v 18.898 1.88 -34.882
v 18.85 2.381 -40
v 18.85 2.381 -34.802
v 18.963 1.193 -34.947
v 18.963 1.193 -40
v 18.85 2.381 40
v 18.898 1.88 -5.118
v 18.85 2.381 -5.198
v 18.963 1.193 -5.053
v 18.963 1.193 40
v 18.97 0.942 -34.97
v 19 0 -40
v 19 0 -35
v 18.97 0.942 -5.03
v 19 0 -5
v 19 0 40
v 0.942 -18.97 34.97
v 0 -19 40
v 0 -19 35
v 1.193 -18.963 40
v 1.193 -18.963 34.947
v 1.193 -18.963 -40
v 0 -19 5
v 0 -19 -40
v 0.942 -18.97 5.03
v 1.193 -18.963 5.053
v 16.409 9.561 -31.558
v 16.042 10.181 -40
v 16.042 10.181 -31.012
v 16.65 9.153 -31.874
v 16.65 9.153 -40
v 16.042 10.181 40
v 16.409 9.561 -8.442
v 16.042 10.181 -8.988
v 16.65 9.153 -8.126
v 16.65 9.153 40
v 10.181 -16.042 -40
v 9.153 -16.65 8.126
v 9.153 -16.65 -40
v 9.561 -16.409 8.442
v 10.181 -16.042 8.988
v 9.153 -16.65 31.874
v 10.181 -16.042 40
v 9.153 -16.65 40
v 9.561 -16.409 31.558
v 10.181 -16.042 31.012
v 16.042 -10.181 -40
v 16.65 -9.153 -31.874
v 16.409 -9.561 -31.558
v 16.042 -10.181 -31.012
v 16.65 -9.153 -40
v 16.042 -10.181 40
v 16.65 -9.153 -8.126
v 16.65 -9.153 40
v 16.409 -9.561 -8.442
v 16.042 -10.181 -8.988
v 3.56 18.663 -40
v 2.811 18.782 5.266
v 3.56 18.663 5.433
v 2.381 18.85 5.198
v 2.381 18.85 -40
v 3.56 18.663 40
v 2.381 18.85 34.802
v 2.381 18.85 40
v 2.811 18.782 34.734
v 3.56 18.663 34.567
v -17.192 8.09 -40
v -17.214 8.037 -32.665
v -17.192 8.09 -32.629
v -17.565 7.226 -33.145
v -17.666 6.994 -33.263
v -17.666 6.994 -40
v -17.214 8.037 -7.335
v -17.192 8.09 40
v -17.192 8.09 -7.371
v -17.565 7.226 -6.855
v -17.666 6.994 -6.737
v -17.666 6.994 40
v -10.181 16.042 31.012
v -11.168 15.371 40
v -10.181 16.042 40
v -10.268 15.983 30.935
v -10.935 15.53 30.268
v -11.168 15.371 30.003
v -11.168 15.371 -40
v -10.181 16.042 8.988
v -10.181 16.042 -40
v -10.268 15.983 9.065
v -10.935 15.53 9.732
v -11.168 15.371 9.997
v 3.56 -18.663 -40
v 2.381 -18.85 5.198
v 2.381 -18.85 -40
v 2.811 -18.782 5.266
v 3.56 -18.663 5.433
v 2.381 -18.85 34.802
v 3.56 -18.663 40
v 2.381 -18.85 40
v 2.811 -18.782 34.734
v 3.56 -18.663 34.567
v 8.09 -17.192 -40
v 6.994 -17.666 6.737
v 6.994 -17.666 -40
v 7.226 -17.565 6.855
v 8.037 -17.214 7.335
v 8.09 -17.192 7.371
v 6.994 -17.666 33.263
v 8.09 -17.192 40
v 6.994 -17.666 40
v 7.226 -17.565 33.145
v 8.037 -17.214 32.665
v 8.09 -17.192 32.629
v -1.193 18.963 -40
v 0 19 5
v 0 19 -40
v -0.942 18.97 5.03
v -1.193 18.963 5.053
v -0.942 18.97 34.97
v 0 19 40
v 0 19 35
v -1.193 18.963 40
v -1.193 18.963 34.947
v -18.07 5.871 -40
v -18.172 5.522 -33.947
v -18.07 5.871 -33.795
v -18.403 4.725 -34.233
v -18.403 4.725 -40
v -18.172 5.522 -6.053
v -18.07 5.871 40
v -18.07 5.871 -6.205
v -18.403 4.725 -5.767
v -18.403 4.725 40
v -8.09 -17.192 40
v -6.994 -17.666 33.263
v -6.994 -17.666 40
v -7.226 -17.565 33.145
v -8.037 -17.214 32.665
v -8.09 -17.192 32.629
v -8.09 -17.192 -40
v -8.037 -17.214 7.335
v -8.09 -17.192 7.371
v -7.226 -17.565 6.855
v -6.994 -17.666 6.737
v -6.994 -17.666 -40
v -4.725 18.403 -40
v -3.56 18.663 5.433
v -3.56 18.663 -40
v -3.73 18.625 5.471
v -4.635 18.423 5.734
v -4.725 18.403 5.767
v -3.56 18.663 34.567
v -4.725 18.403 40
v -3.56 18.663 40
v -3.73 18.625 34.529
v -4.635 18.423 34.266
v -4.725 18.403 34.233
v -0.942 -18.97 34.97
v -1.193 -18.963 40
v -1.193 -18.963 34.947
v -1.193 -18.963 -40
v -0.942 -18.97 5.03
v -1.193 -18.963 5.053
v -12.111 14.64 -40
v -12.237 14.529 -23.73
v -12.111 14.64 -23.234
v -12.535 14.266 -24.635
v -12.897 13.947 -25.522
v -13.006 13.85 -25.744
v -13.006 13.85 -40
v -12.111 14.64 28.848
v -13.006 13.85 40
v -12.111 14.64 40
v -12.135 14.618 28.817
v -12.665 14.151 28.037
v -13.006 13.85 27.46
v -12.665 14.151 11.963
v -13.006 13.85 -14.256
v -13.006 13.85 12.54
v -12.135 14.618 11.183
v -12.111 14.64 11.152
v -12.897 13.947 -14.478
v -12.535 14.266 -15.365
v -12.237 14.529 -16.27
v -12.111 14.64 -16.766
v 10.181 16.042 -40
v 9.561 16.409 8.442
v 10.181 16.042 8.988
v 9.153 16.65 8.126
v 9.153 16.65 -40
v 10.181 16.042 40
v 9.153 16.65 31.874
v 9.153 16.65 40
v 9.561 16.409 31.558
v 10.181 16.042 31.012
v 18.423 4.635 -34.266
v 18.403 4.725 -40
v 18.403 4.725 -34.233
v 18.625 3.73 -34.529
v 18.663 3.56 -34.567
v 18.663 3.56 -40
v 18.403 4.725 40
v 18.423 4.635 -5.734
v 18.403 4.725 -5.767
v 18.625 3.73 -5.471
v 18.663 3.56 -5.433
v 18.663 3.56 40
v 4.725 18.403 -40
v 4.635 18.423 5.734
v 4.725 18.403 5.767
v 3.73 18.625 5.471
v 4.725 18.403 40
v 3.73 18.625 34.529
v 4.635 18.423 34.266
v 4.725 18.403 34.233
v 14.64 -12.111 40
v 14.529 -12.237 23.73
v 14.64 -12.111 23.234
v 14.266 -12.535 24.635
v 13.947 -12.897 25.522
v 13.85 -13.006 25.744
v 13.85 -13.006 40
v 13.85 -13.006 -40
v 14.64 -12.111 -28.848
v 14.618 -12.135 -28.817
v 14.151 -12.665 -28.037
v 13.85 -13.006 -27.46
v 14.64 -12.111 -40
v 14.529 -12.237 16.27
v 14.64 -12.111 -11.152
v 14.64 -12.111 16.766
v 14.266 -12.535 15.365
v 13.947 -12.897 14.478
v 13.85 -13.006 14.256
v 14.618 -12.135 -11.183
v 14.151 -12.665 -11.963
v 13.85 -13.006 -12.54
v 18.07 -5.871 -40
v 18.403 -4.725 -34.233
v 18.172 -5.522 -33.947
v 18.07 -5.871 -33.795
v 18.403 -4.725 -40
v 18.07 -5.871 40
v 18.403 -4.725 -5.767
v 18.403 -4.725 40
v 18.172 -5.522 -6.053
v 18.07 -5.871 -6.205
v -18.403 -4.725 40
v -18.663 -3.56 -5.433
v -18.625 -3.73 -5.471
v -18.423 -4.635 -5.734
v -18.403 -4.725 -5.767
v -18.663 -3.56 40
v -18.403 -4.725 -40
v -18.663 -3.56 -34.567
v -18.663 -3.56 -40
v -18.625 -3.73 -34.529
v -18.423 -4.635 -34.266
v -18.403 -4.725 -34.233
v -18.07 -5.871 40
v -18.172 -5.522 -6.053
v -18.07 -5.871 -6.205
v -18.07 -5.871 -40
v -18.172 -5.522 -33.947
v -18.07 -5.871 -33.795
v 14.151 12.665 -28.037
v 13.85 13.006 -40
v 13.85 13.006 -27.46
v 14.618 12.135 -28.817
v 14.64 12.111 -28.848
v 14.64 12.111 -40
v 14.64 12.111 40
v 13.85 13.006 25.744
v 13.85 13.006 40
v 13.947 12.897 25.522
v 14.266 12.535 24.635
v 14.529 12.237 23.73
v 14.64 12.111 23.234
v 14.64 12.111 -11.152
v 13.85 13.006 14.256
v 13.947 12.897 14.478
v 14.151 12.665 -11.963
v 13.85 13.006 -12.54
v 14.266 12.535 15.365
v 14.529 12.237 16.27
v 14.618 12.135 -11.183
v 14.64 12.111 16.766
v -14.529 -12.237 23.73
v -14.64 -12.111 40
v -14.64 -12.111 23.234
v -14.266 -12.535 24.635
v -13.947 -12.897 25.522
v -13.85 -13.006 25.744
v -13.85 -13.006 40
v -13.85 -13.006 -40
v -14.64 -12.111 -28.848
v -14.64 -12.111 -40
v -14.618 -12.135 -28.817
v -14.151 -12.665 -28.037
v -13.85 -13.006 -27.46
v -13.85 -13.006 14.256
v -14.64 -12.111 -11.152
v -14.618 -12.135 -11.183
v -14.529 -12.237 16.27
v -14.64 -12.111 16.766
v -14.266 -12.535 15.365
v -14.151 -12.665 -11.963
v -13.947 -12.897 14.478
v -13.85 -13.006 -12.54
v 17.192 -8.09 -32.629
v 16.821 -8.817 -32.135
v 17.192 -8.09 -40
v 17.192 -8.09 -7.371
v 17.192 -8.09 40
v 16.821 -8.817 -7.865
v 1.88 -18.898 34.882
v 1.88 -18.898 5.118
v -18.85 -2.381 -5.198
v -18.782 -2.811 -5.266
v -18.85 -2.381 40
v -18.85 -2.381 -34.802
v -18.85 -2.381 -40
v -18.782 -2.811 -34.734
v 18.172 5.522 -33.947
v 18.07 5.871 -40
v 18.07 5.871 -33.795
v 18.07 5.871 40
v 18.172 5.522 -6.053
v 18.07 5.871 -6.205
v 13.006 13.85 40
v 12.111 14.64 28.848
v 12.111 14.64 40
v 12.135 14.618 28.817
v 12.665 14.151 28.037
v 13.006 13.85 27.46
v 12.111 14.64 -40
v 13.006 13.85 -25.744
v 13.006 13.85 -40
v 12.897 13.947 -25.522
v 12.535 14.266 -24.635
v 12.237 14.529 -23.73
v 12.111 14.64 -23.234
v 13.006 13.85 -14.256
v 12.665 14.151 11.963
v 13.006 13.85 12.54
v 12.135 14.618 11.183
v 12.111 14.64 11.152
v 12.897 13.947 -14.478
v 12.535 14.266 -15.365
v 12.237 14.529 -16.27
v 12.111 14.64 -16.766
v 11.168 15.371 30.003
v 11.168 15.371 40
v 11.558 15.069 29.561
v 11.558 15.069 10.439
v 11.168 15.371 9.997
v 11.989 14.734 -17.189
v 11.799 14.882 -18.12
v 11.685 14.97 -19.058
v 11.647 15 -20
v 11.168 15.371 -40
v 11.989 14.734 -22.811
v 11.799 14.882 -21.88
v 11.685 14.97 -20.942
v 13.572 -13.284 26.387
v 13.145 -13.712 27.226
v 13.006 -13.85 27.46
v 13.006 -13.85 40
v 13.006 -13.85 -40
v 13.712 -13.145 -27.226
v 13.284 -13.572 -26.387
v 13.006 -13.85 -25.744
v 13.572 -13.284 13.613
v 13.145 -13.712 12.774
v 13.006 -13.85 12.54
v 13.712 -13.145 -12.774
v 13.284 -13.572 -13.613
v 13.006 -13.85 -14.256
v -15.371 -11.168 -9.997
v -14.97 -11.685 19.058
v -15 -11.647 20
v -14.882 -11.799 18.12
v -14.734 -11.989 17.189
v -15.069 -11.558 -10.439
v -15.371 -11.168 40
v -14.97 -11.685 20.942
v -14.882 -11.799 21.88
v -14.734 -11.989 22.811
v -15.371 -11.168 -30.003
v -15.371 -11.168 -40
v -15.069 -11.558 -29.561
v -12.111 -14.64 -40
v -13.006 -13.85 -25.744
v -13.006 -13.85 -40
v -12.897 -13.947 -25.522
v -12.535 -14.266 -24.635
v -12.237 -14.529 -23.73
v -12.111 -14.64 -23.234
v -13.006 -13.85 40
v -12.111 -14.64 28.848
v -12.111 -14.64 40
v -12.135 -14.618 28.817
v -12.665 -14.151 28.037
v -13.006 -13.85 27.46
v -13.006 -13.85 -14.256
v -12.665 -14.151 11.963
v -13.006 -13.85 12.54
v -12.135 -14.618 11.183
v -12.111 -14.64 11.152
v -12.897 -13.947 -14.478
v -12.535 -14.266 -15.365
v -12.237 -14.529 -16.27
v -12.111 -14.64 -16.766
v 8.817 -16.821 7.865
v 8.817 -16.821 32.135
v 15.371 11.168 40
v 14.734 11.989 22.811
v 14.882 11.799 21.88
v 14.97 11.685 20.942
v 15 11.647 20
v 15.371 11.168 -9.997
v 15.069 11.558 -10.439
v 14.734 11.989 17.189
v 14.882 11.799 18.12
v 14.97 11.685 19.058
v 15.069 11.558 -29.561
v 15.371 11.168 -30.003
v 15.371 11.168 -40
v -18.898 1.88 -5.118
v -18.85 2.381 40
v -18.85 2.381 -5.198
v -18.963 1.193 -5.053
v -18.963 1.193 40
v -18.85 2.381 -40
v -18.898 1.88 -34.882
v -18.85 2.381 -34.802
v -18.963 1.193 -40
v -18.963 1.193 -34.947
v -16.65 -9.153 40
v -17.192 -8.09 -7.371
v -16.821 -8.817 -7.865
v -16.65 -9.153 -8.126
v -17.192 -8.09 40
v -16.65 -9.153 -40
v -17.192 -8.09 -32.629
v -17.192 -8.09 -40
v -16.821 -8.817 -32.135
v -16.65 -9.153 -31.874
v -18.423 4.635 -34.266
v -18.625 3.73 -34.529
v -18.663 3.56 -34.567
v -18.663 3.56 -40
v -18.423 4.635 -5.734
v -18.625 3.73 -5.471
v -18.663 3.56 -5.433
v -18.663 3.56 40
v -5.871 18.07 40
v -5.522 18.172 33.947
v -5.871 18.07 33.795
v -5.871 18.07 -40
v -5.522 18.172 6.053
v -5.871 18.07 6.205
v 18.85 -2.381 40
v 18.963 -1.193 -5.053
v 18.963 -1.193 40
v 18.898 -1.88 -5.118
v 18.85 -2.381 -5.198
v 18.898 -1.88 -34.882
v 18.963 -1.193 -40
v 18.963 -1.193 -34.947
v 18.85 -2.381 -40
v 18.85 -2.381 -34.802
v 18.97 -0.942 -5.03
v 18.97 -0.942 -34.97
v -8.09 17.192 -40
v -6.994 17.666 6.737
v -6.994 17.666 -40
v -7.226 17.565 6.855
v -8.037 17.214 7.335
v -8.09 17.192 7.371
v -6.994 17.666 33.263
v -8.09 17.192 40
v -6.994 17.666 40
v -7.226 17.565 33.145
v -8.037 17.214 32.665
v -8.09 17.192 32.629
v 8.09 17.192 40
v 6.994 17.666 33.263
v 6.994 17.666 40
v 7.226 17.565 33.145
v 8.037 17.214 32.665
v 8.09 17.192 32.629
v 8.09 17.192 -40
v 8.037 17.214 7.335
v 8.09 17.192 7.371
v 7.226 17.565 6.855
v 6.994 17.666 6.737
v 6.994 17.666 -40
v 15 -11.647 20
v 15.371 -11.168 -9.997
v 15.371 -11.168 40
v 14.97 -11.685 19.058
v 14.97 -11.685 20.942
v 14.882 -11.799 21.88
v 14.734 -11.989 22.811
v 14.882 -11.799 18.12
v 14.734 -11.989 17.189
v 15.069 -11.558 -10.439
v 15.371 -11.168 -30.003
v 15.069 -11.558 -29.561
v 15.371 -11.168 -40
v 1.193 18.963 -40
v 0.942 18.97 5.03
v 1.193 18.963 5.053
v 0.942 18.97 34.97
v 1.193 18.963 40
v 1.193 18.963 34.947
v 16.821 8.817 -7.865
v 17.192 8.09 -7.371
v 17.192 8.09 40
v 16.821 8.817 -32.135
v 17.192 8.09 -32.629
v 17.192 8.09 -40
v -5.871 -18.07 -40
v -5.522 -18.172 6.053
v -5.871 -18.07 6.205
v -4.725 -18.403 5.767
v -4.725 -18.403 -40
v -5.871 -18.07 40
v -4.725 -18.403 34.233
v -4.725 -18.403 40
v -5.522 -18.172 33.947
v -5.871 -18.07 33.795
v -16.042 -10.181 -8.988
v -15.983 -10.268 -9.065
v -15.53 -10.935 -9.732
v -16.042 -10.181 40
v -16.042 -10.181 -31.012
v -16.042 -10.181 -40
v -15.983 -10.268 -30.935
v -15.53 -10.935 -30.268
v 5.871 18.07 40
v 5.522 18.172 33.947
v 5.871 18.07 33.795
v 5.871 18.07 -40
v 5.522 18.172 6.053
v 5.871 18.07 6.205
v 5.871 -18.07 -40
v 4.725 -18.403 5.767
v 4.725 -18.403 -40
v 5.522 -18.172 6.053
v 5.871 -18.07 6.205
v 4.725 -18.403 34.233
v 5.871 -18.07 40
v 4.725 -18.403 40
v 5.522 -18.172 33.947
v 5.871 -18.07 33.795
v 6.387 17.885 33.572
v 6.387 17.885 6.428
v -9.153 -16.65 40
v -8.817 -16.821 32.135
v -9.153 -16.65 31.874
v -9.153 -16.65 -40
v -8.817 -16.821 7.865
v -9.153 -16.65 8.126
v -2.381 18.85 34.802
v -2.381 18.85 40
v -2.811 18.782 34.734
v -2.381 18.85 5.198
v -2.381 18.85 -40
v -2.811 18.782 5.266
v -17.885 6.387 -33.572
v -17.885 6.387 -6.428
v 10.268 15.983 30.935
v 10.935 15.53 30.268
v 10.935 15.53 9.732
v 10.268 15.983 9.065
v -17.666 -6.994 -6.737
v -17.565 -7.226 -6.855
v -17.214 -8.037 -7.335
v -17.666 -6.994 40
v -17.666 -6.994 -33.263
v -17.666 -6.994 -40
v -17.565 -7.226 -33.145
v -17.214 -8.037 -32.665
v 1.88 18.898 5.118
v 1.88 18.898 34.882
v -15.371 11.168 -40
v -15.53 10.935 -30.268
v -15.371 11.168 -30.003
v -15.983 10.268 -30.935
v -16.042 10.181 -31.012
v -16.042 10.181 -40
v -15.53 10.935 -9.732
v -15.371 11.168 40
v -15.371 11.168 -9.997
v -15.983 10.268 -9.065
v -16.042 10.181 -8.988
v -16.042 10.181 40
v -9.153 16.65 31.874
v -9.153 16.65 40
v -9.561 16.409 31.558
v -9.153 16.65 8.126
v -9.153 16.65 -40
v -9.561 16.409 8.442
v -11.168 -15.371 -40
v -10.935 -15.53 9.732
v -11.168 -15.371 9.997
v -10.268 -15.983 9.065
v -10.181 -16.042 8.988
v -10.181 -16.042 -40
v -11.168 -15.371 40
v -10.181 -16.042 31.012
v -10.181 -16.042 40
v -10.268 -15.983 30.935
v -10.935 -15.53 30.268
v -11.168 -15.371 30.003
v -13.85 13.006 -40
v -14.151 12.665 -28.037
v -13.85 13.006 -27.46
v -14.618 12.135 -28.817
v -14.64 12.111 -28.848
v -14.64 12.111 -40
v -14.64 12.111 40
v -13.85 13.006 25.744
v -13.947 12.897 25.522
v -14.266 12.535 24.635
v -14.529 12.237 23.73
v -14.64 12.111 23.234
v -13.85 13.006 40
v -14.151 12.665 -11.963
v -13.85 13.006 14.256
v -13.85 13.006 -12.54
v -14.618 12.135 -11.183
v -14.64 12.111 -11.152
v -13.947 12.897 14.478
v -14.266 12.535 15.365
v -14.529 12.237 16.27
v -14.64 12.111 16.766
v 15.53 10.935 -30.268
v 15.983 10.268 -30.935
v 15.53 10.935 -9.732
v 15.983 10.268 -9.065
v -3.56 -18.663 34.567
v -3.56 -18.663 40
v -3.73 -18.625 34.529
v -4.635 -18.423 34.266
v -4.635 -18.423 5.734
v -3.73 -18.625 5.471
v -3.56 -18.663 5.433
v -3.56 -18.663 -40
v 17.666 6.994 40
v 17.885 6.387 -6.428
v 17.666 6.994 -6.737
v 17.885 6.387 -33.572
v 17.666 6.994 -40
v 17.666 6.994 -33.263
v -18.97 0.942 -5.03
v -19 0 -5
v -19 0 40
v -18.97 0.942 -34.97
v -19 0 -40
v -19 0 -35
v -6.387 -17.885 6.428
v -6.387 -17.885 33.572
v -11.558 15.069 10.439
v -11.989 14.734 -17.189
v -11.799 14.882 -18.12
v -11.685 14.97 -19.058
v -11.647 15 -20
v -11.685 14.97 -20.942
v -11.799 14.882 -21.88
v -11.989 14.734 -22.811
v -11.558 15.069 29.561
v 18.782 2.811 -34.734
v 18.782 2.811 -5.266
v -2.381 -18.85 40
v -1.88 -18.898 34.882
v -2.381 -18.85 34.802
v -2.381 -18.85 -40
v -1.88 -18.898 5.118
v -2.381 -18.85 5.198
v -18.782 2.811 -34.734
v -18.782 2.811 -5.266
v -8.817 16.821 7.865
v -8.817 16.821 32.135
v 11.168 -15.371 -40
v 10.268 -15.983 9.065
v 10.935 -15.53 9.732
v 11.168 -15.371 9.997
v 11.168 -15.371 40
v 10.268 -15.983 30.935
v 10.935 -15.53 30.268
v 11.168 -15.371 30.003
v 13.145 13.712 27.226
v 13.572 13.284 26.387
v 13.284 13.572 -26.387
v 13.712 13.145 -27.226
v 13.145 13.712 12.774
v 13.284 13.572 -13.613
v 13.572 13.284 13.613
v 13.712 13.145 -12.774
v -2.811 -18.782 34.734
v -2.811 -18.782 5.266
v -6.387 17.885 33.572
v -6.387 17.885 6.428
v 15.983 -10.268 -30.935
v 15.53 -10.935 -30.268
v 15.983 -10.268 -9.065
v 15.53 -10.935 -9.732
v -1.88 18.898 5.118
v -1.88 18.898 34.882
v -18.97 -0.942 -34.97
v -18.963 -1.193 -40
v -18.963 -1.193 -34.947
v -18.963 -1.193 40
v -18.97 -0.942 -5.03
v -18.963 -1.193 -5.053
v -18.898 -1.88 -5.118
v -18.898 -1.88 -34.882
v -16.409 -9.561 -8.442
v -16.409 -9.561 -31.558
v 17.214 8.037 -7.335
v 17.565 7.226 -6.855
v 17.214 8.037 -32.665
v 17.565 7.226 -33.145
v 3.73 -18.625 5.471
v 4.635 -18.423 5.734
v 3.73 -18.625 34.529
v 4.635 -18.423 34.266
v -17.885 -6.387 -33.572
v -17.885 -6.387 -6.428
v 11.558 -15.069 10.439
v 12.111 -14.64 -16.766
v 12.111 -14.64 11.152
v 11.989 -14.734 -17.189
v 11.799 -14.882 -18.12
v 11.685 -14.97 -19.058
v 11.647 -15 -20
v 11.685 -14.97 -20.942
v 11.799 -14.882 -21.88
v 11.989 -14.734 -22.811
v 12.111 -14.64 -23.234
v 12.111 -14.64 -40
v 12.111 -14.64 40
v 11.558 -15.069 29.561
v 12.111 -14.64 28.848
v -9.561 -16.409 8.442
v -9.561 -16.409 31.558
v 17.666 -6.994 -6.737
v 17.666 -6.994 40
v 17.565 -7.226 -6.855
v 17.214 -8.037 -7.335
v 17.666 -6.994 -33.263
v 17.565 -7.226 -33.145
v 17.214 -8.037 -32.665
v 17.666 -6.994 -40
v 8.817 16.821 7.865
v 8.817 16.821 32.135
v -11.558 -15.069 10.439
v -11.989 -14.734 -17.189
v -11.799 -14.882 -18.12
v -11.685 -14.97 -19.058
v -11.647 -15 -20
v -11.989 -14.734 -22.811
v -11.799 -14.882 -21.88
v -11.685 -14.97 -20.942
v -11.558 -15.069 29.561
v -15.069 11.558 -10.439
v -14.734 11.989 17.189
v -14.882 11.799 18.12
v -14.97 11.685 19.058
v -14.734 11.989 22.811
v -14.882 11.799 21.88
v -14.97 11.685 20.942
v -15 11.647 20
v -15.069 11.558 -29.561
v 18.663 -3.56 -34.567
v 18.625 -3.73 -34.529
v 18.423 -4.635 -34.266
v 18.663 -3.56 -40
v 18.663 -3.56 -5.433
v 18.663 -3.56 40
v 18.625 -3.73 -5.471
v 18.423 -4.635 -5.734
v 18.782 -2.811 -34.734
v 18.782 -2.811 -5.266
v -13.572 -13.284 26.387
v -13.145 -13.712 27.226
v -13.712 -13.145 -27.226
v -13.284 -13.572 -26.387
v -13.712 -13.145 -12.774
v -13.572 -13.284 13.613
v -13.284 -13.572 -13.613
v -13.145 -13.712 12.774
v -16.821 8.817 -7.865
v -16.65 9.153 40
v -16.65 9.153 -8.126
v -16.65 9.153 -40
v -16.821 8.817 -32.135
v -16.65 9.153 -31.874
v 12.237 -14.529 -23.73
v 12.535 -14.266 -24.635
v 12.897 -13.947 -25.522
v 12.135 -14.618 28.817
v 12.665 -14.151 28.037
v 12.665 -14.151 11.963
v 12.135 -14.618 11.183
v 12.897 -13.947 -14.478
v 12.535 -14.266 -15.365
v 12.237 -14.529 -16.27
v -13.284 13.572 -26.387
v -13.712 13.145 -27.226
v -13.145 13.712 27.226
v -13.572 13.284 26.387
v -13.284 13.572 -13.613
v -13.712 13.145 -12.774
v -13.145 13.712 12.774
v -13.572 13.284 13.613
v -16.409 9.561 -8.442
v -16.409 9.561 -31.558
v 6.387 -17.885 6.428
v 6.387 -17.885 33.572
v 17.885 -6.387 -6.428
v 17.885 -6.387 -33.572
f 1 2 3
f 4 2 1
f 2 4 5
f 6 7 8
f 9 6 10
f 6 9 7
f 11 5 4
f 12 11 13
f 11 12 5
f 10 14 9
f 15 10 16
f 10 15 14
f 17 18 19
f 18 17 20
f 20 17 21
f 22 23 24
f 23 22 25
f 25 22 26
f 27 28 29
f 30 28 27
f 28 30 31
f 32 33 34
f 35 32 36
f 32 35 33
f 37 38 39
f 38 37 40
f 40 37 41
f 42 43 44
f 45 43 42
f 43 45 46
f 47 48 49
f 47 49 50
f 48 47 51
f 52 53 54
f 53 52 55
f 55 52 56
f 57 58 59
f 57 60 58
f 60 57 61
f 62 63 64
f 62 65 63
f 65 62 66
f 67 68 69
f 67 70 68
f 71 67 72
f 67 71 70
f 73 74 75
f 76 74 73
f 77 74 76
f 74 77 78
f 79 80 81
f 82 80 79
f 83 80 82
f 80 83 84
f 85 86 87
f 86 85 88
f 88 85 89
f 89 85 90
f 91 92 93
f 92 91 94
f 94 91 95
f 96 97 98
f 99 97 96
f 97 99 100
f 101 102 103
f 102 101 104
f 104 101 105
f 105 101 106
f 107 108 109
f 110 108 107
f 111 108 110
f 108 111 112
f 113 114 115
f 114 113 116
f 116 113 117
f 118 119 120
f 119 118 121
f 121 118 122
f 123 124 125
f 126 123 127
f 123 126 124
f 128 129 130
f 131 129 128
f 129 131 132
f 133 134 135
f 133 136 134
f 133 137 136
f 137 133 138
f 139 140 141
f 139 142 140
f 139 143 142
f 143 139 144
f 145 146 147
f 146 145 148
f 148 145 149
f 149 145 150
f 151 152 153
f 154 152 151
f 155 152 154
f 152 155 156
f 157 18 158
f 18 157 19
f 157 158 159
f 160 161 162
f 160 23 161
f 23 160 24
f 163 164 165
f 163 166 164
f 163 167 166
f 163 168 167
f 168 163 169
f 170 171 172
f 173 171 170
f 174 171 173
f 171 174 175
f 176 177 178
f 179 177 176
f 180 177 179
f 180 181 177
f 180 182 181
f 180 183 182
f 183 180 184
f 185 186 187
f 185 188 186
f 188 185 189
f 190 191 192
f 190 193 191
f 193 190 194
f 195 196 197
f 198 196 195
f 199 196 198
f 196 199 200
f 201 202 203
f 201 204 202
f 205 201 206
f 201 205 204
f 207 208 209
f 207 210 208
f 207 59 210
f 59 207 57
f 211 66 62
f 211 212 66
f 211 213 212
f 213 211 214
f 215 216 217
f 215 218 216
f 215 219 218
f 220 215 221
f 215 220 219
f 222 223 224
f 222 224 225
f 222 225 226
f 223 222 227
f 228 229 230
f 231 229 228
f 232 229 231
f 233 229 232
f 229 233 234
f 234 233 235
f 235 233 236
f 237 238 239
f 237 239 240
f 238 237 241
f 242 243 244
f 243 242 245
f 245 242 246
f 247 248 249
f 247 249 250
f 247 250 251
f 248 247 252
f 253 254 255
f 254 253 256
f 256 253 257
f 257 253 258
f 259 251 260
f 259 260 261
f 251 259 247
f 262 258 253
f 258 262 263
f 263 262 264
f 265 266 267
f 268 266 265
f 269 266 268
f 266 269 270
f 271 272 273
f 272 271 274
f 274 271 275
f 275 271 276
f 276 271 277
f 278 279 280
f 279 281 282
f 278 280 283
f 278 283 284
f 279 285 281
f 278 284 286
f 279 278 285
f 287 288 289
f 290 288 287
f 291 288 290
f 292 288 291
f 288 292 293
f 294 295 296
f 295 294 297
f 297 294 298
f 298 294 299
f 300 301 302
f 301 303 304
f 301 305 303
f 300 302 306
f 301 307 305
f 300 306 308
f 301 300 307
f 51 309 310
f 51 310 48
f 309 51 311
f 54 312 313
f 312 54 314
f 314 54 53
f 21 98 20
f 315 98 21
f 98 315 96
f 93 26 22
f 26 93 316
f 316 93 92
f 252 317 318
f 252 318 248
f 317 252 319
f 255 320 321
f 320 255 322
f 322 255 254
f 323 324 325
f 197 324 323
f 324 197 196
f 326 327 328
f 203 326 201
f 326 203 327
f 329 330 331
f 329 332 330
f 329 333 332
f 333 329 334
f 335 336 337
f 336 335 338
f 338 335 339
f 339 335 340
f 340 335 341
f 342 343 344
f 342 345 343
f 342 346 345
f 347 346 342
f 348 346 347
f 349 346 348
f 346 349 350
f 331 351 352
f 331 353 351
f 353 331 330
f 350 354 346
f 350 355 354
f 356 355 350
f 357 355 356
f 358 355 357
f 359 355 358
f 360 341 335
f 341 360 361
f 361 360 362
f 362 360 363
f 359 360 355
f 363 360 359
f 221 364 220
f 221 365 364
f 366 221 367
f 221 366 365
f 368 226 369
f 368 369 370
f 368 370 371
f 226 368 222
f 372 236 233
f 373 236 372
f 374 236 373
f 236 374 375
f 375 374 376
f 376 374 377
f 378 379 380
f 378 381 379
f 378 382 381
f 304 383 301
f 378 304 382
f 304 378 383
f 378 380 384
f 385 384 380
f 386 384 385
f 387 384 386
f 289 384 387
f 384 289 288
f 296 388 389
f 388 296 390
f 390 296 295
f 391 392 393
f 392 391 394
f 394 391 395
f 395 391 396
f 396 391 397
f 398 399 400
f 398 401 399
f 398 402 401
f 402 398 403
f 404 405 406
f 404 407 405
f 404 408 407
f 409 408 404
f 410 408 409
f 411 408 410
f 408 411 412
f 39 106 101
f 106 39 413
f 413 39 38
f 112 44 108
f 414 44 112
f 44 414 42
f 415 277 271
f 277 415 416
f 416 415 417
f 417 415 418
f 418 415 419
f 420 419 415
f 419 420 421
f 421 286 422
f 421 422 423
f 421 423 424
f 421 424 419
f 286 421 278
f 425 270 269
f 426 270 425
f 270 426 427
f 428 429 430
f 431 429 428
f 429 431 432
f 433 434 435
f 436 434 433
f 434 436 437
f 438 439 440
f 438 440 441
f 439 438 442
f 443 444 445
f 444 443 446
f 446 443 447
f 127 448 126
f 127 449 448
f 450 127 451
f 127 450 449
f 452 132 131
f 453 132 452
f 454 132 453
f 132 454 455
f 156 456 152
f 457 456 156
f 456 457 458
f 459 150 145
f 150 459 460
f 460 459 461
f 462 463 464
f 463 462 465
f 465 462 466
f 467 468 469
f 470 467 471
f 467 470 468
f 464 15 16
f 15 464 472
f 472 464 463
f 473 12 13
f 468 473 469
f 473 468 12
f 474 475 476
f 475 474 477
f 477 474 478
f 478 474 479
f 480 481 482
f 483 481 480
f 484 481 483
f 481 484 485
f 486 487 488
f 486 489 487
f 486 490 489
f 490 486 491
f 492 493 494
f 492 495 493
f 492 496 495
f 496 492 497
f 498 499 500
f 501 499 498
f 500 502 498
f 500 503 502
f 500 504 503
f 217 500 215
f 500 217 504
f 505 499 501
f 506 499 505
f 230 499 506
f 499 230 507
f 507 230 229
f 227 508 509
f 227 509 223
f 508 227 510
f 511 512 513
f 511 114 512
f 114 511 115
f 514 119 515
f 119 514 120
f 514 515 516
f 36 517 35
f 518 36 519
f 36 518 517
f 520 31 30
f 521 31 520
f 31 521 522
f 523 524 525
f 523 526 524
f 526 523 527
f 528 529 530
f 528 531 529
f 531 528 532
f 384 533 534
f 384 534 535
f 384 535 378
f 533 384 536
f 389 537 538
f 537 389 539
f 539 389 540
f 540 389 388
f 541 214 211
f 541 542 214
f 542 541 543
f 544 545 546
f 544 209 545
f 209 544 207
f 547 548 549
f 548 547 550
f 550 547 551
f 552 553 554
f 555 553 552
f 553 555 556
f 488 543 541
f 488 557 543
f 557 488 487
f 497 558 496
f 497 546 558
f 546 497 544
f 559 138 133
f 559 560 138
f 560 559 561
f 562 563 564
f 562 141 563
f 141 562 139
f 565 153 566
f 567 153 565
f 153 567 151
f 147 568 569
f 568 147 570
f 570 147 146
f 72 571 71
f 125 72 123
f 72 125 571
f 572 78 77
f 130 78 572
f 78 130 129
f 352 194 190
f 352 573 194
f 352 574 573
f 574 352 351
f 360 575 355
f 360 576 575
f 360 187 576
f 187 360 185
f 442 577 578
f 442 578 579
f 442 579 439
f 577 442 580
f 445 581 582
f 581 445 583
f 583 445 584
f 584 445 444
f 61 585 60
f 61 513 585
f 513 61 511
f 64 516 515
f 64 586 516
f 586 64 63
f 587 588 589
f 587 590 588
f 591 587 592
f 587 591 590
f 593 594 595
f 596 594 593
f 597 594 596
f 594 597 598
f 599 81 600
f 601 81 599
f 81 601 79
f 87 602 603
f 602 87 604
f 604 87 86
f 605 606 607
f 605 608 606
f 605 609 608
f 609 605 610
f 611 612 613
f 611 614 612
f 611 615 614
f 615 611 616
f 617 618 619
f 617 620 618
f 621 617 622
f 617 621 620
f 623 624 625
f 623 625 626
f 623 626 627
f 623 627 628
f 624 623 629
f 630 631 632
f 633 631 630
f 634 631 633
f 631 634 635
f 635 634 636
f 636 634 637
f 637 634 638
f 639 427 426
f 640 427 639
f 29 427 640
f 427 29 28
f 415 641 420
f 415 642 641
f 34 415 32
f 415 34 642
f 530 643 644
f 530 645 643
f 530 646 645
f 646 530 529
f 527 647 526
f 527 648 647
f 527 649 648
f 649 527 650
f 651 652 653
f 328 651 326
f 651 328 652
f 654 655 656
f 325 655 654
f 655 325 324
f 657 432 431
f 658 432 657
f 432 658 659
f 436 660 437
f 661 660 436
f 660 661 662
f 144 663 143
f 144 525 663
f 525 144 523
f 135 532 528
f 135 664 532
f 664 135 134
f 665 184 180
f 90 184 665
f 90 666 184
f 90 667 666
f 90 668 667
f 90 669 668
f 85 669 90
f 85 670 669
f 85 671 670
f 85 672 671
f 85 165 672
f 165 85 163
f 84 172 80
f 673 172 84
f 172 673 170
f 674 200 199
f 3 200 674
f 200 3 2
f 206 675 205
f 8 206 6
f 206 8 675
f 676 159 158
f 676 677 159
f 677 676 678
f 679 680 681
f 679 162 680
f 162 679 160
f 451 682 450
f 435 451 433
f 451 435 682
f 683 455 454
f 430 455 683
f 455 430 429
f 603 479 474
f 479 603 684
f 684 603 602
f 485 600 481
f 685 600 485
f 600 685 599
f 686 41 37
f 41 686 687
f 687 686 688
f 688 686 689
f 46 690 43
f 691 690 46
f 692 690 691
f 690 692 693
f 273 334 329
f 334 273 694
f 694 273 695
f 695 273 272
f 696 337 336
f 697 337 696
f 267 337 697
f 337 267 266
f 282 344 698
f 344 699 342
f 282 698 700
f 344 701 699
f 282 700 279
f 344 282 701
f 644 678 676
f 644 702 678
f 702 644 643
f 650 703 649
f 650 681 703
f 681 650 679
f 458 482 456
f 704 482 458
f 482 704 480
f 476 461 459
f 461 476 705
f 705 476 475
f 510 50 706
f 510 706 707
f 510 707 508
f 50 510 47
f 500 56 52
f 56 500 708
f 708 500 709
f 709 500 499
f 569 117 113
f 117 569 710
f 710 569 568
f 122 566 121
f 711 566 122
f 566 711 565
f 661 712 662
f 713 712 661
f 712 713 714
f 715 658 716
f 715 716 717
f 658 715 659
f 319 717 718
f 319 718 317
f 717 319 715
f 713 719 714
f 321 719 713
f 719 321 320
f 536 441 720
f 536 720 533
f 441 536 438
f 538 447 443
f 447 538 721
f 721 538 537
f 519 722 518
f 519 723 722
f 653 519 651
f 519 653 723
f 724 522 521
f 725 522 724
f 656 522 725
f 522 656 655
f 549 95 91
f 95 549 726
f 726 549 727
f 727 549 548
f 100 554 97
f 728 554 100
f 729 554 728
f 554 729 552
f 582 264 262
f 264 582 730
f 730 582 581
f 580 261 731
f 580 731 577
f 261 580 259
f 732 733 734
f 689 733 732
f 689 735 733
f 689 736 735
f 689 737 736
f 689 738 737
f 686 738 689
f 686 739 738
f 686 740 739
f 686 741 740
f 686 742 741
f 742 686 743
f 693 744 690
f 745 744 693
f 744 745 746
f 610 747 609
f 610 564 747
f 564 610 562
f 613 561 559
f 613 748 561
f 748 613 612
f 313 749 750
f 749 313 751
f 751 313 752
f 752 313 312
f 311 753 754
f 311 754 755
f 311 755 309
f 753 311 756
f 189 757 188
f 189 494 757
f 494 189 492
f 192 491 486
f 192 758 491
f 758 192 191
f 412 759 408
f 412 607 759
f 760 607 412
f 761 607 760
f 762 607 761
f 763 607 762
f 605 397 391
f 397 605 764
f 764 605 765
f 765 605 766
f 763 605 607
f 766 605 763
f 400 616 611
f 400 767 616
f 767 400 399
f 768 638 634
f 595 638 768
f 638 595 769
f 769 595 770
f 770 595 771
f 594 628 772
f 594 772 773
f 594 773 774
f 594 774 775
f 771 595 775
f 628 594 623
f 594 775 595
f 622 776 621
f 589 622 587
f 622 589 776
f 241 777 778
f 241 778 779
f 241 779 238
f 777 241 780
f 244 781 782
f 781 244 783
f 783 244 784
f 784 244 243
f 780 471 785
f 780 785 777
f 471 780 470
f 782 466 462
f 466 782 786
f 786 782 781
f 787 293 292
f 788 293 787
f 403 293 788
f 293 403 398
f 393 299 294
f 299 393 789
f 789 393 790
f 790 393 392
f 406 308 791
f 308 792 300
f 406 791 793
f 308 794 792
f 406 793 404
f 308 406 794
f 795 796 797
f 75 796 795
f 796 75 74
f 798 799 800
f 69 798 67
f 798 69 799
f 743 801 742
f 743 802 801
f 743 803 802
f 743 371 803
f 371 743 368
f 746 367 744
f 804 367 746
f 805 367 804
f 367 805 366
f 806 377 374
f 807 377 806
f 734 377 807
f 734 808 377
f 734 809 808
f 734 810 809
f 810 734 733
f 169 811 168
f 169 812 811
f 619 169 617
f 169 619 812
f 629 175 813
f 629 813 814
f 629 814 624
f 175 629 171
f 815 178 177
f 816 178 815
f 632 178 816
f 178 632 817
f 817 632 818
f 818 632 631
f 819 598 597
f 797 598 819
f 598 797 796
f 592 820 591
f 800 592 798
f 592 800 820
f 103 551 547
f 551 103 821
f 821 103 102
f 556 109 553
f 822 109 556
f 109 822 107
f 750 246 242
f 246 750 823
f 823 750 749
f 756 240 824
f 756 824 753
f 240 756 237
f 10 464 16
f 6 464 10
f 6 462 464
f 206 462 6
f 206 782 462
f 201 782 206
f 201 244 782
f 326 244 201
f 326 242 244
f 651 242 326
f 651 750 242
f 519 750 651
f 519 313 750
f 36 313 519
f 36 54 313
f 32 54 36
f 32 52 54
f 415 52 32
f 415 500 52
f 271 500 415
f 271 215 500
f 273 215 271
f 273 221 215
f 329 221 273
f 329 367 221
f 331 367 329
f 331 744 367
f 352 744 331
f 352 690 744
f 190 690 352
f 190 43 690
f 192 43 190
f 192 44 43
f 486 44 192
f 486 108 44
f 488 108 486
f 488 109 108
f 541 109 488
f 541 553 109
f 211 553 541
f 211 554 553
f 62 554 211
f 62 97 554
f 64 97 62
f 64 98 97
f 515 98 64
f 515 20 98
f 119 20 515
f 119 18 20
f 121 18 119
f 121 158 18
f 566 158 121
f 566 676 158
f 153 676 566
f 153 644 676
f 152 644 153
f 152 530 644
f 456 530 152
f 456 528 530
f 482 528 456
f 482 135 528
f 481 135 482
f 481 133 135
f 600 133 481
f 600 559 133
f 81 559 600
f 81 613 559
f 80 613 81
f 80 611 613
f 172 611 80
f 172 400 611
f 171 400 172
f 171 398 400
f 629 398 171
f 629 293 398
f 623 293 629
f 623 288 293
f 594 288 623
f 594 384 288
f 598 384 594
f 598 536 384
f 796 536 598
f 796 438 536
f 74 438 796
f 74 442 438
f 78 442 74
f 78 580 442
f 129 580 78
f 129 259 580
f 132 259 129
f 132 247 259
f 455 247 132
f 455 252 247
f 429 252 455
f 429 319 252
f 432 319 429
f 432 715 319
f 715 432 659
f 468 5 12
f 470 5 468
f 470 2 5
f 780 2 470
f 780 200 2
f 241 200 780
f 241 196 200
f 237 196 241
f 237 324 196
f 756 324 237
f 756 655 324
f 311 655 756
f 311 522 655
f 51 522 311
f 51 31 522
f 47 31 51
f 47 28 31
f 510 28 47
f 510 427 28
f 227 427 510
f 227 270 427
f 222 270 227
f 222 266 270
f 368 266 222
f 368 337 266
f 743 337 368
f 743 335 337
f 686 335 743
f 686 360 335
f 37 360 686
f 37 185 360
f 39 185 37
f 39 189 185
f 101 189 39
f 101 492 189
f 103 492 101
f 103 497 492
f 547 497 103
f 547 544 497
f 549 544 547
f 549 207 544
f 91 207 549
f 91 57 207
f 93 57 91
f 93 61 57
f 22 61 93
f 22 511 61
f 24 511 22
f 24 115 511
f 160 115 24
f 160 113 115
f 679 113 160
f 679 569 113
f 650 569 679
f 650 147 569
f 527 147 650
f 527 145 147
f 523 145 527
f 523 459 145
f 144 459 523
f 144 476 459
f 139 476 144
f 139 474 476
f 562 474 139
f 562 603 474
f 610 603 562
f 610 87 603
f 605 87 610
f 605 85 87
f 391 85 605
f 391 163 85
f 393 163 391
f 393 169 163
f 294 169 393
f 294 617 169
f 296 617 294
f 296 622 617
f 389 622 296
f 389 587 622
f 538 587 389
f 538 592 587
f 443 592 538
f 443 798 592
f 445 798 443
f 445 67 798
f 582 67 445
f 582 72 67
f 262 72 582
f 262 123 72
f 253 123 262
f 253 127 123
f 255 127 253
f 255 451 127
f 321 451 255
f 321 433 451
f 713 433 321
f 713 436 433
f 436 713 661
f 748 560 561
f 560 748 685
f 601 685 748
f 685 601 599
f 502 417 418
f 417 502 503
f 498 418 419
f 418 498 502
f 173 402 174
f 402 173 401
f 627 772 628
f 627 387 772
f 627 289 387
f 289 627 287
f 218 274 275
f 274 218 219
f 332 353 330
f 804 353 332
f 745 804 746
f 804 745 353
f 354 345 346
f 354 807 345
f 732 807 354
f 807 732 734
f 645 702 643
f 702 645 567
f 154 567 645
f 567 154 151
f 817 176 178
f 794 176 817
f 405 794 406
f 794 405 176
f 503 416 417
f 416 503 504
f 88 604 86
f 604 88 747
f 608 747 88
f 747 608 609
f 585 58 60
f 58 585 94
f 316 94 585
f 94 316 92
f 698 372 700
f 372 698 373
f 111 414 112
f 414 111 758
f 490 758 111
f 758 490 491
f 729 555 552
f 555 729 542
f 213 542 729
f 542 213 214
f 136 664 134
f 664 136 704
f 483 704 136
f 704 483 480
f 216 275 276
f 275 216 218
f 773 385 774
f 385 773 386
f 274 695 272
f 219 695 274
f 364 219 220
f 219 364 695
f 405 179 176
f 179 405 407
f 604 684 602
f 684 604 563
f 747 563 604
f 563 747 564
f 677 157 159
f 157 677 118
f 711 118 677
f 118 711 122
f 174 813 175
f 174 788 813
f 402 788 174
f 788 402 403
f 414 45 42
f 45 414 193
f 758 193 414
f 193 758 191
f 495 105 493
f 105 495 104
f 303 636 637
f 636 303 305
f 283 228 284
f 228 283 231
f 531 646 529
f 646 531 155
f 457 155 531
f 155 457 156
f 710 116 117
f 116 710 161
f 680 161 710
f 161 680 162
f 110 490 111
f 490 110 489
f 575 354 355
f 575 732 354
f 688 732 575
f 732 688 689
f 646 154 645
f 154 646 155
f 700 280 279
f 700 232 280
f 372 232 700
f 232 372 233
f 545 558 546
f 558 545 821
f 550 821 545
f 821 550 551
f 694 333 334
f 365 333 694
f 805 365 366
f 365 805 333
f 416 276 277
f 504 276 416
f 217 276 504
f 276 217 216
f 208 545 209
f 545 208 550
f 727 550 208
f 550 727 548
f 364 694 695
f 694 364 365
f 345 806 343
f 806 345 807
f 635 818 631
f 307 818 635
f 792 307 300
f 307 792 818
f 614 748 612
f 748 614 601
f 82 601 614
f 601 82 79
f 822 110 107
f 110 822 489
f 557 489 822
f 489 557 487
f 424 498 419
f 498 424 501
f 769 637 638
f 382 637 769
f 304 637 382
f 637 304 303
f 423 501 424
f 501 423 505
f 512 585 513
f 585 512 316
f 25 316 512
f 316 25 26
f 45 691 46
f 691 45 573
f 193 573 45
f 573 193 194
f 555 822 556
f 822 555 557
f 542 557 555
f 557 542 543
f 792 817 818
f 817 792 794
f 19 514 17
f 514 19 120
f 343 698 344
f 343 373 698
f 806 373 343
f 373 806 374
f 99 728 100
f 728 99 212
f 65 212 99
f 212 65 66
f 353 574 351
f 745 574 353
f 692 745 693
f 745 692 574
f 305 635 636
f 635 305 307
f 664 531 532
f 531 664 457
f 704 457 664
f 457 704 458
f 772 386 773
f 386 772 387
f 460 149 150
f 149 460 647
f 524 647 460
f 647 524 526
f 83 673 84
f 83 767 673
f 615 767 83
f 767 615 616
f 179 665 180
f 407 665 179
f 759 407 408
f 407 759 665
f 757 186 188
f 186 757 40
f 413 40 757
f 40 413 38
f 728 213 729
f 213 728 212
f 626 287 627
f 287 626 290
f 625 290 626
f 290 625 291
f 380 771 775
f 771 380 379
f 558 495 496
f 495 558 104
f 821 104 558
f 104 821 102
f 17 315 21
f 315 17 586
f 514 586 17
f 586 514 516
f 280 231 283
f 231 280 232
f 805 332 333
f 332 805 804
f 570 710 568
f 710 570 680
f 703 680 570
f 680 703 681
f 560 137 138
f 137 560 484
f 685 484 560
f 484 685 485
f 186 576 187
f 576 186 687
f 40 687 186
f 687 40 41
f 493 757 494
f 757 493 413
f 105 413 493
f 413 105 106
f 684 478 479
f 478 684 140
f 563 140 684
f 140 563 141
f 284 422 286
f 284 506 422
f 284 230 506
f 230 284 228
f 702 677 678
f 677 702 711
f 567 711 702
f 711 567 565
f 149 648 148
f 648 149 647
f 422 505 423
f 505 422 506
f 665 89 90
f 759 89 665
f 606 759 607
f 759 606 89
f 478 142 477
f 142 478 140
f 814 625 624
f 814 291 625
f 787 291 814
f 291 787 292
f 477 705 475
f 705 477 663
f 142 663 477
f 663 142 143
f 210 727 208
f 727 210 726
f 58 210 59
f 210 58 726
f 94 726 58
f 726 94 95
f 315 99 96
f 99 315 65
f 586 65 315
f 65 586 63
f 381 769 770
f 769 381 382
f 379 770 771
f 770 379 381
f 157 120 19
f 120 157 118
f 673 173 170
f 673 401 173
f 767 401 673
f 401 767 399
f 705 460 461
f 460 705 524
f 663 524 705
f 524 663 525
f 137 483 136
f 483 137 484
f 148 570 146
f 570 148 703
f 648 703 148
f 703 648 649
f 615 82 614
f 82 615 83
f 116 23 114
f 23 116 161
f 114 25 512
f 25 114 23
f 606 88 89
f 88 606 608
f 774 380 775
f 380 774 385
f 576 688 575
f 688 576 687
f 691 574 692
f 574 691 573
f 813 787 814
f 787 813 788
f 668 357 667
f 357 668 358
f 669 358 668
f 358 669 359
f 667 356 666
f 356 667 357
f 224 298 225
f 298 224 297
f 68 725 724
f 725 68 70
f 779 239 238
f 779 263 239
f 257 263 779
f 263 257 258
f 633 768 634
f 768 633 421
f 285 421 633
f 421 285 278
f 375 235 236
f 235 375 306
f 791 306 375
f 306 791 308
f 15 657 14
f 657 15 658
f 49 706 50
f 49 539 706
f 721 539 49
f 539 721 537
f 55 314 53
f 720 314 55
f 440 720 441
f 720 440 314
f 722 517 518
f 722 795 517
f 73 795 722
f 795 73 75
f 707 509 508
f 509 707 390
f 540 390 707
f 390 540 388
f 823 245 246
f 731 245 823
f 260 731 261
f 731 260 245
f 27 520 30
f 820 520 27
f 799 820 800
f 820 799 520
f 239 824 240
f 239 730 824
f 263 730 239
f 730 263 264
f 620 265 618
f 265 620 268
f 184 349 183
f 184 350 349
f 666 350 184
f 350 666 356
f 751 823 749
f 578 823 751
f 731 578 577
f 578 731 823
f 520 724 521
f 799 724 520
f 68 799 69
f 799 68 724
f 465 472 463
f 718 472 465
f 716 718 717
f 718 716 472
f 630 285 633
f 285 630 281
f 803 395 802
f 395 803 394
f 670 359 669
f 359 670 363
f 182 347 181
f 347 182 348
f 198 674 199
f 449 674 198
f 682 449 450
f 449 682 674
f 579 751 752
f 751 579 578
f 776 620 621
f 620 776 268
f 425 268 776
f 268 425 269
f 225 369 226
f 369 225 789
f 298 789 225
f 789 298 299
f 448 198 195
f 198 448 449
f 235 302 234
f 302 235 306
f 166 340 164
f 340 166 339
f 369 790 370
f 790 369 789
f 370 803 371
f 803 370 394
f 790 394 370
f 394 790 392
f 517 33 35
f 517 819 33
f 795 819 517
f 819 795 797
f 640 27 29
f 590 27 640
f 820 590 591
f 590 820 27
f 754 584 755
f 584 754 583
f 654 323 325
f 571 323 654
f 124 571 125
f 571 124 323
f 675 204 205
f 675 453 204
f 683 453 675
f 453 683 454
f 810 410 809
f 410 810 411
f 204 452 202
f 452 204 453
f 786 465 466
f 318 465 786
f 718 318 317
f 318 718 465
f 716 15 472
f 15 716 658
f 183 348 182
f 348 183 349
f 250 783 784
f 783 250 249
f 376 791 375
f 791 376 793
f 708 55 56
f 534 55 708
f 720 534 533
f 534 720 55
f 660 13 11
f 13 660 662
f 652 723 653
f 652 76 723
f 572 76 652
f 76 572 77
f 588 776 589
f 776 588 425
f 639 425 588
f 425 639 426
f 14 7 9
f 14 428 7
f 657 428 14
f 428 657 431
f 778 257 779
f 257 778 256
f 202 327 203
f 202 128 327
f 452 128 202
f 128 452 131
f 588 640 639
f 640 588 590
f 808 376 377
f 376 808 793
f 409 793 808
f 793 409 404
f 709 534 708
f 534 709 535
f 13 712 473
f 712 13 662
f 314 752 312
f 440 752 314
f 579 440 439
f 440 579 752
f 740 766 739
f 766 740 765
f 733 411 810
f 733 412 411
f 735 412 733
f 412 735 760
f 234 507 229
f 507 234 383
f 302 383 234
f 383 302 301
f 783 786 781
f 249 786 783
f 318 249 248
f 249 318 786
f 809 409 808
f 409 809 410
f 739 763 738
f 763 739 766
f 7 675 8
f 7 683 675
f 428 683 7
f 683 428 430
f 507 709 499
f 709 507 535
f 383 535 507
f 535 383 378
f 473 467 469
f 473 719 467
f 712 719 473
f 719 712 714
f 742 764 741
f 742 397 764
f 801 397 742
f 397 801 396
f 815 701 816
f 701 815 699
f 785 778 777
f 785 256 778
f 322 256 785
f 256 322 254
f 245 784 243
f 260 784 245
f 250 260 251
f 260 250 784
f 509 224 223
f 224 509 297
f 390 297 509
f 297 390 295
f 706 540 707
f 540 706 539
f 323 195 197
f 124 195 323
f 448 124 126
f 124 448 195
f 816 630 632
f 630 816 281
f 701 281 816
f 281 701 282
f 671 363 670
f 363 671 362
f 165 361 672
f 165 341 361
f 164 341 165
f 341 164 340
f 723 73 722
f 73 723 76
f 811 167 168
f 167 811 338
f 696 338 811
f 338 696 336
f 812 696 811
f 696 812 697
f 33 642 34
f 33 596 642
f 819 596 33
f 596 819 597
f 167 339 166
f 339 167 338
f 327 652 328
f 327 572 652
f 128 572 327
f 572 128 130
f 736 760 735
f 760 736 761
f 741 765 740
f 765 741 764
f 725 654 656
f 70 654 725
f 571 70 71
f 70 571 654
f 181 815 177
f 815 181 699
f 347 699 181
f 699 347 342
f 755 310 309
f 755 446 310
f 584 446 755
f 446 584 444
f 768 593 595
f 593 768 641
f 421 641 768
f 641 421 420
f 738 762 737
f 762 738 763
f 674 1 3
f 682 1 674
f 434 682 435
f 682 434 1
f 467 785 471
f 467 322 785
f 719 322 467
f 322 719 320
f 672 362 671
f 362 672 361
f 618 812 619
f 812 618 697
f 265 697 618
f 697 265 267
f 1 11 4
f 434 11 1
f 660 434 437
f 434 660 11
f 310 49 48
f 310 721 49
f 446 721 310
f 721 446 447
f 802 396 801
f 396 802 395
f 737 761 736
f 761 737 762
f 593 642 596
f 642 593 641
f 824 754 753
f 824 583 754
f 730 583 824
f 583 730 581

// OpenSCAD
/*
    for building a house with pvc tubes
*/

difference() {
	cylinder (h = 80, r=19, center = true, $fn=100);
	translate ([0,0,20]) rotate ([90,0,0]) cylinder (h = 40, r=15, center = true, $fn=100);
    translate ([0,0,-20]) rotate ([90,0,90]) cylinder (h = 40, r=15, center = true, $fn=100);
}
